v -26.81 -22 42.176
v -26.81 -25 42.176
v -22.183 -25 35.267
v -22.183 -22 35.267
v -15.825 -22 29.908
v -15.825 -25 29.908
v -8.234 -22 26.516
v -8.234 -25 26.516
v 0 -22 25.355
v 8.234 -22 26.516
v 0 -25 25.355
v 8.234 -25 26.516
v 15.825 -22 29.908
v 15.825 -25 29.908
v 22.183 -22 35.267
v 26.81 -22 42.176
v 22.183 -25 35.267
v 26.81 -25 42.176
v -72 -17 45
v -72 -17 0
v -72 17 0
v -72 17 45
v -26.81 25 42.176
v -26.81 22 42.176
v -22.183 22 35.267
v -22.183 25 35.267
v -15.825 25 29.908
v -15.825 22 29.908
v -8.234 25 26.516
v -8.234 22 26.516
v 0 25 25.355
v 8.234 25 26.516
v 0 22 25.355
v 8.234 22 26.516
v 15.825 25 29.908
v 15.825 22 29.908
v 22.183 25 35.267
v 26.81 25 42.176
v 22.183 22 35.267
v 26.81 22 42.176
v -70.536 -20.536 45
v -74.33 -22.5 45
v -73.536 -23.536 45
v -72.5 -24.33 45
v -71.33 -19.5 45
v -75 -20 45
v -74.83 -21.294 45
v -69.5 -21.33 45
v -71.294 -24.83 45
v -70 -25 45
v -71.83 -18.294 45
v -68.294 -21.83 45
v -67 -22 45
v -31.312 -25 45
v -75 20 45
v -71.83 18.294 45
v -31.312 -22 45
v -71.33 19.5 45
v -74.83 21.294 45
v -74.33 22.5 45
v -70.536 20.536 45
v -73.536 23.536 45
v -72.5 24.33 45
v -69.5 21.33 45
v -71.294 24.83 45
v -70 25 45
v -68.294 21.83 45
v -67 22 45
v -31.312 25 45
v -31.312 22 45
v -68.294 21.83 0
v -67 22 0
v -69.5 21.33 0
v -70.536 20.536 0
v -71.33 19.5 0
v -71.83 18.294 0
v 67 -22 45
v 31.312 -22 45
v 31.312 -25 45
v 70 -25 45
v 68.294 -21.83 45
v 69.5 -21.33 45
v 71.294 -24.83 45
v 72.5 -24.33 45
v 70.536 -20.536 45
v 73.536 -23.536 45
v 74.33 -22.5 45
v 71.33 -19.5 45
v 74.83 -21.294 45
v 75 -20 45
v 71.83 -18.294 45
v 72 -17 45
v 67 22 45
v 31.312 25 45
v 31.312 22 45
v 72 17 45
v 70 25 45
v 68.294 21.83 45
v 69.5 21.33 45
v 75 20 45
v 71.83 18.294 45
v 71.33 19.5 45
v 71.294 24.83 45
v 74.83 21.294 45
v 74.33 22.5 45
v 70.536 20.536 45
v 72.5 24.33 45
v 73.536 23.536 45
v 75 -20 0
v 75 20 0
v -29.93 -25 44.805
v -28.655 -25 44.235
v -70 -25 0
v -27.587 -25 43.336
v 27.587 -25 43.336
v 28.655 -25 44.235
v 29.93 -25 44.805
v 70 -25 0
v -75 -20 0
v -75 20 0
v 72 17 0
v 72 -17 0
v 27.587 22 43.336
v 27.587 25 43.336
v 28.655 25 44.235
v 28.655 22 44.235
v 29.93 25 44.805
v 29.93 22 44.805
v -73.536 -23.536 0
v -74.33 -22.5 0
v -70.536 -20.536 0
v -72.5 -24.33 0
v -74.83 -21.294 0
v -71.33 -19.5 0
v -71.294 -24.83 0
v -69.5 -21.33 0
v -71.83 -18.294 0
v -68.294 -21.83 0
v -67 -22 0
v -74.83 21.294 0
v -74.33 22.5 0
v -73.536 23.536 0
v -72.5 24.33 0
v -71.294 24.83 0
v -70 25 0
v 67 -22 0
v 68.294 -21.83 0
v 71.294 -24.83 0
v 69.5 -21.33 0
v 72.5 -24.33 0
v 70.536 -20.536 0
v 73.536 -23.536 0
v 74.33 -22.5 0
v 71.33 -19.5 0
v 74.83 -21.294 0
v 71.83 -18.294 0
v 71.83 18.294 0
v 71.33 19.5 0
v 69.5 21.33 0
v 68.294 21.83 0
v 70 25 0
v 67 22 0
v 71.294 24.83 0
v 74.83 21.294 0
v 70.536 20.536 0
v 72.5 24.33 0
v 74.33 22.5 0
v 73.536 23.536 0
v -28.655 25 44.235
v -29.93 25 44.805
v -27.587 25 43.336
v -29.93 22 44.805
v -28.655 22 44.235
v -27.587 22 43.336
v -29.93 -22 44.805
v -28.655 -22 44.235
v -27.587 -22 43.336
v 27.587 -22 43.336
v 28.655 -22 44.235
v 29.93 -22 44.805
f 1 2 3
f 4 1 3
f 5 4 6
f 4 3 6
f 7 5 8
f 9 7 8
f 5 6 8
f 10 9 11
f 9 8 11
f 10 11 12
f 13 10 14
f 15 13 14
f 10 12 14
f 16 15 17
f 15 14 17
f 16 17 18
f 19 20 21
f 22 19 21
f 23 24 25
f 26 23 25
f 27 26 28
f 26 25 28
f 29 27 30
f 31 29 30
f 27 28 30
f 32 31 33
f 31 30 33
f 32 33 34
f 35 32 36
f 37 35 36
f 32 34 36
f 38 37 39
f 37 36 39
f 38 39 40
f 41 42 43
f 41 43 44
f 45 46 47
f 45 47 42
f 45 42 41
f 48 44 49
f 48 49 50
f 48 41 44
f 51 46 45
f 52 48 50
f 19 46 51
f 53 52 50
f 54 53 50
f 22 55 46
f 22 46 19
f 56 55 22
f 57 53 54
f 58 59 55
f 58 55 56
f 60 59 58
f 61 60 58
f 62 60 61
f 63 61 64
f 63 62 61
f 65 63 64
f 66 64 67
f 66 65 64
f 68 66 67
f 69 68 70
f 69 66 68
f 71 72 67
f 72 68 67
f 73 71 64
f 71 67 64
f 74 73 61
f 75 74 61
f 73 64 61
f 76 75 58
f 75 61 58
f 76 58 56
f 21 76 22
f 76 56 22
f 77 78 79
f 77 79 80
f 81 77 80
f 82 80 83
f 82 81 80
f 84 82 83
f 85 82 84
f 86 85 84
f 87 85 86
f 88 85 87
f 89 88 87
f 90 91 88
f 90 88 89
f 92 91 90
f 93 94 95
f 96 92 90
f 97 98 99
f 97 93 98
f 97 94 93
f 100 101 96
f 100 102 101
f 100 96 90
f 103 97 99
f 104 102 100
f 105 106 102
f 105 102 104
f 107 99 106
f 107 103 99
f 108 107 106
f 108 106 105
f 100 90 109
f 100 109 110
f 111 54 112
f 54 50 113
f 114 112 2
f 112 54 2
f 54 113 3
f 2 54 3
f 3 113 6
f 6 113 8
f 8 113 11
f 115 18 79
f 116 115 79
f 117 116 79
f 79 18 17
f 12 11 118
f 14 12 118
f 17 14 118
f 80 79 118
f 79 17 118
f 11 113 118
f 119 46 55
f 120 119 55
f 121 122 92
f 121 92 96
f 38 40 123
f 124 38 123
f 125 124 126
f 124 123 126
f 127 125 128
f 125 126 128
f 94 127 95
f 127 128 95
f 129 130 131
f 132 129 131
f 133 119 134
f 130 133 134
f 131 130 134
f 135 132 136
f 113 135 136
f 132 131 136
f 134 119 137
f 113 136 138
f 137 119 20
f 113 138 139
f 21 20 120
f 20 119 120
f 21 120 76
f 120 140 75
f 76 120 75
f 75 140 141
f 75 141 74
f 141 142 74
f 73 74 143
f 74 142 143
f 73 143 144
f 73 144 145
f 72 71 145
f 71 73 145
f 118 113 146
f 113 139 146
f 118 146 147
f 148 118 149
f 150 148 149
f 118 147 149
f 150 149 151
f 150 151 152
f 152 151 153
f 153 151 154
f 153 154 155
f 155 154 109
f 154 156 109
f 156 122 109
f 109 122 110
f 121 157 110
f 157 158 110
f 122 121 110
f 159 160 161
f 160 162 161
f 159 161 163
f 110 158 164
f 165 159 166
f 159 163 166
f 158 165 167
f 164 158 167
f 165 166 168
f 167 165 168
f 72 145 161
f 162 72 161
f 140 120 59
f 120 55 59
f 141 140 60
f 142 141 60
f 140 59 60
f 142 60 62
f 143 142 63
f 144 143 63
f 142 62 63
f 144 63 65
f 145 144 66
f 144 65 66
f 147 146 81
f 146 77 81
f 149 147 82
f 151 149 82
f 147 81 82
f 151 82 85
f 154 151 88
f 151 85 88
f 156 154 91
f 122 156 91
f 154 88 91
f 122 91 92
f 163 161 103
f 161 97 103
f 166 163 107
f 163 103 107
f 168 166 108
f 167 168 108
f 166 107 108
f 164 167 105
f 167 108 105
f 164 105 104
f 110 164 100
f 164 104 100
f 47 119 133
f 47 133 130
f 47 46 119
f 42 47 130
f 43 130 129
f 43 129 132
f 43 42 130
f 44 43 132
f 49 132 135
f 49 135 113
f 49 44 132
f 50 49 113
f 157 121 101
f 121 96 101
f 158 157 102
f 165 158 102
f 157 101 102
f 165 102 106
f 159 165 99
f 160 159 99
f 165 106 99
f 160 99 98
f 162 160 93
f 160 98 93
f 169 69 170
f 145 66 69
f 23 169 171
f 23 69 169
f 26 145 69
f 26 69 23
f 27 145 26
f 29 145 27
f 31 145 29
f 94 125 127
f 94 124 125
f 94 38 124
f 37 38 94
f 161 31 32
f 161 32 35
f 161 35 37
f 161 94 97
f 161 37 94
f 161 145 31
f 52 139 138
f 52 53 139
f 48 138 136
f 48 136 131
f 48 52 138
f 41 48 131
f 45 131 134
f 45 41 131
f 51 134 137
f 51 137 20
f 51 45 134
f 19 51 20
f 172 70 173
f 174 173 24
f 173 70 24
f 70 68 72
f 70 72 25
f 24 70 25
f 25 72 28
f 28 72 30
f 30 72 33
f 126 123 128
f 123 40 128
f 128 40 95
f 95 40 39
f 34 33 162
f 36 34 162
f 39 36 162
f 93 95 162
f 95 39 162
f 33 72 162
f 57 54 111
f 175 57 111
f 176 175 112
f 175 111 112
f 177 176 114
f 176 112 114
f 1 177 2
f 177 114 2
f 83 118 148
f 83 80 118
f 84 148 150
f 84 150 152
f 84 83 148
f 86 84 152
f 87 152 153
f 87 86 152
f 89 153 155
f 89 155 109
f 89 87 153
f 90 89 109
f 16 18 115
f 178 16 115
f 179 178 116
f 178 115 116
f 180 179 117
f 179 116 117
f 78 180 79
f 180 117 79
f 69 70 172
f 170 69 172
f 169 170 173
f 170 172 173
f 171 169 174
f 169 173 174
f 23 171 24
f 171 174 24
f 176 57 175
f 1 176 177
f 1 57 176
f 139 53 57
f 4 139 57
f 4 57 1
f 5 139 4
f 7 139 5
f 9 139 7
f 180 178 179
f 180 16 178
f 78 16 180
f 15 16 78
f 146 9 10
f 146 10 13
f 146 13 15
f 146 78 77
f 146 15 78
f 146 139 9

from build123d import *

# Parameters (mm, degrees)
F0_W     = 150
F0_H     = 50
F0_W_2   = 144
F0_H_2   = 44
F1_DEPTH = 45
F3_DEPTH = 53.9
F4_R     = 5


with BuildPart() as f1:
    # F0 (on Top) → F1 (new body)
    with BuildSketch(Plane.XY):
        Rectangle(F0_W, F0_H)
        Rectangle(F0_W_2, F0_H_2, mode=Mode.SUBTRACT)
    extrude(amount=F1_DEPTH)

    # F2 (on face) → F3 (cut)
    with BuildSketch(Plane.XZ.offset(25)):
        with BuildLine():
            ThreePointArc((-31.312153, 45), (-28.654867, 44.235426), (-26.810258, 42.175533))
            ThreePointArc((-26.810258, 42.175533), (0, 25.354907), (26.810258, 42.175533))
            ThreePointArc((26.810258, 42.175533), (28.654867, 44.235426), (31.312153, 45))
            Line((31.312153, 45), (-31.312153, 45))
        make_face()
    extrude(amount=-F3_DEPTH, mode=Mode.SUBTRACT)

    # F4
    f4_edges = [f1.edges().sort_by_distance(p)[0] for p in [
        (-75, 25, 22.5),
        (-75, -25, 22.5),
        (75, 25, 22.5),
        (75, -25, 22.5),
        (-72, -22, 22.5),
        (72, -22, 22.5),
        (72, 22, 22.5),
        (-72, 22, 22.5),
    ]]
    fillet(f4_edges, radius=F4_R)


solid = f1.part
